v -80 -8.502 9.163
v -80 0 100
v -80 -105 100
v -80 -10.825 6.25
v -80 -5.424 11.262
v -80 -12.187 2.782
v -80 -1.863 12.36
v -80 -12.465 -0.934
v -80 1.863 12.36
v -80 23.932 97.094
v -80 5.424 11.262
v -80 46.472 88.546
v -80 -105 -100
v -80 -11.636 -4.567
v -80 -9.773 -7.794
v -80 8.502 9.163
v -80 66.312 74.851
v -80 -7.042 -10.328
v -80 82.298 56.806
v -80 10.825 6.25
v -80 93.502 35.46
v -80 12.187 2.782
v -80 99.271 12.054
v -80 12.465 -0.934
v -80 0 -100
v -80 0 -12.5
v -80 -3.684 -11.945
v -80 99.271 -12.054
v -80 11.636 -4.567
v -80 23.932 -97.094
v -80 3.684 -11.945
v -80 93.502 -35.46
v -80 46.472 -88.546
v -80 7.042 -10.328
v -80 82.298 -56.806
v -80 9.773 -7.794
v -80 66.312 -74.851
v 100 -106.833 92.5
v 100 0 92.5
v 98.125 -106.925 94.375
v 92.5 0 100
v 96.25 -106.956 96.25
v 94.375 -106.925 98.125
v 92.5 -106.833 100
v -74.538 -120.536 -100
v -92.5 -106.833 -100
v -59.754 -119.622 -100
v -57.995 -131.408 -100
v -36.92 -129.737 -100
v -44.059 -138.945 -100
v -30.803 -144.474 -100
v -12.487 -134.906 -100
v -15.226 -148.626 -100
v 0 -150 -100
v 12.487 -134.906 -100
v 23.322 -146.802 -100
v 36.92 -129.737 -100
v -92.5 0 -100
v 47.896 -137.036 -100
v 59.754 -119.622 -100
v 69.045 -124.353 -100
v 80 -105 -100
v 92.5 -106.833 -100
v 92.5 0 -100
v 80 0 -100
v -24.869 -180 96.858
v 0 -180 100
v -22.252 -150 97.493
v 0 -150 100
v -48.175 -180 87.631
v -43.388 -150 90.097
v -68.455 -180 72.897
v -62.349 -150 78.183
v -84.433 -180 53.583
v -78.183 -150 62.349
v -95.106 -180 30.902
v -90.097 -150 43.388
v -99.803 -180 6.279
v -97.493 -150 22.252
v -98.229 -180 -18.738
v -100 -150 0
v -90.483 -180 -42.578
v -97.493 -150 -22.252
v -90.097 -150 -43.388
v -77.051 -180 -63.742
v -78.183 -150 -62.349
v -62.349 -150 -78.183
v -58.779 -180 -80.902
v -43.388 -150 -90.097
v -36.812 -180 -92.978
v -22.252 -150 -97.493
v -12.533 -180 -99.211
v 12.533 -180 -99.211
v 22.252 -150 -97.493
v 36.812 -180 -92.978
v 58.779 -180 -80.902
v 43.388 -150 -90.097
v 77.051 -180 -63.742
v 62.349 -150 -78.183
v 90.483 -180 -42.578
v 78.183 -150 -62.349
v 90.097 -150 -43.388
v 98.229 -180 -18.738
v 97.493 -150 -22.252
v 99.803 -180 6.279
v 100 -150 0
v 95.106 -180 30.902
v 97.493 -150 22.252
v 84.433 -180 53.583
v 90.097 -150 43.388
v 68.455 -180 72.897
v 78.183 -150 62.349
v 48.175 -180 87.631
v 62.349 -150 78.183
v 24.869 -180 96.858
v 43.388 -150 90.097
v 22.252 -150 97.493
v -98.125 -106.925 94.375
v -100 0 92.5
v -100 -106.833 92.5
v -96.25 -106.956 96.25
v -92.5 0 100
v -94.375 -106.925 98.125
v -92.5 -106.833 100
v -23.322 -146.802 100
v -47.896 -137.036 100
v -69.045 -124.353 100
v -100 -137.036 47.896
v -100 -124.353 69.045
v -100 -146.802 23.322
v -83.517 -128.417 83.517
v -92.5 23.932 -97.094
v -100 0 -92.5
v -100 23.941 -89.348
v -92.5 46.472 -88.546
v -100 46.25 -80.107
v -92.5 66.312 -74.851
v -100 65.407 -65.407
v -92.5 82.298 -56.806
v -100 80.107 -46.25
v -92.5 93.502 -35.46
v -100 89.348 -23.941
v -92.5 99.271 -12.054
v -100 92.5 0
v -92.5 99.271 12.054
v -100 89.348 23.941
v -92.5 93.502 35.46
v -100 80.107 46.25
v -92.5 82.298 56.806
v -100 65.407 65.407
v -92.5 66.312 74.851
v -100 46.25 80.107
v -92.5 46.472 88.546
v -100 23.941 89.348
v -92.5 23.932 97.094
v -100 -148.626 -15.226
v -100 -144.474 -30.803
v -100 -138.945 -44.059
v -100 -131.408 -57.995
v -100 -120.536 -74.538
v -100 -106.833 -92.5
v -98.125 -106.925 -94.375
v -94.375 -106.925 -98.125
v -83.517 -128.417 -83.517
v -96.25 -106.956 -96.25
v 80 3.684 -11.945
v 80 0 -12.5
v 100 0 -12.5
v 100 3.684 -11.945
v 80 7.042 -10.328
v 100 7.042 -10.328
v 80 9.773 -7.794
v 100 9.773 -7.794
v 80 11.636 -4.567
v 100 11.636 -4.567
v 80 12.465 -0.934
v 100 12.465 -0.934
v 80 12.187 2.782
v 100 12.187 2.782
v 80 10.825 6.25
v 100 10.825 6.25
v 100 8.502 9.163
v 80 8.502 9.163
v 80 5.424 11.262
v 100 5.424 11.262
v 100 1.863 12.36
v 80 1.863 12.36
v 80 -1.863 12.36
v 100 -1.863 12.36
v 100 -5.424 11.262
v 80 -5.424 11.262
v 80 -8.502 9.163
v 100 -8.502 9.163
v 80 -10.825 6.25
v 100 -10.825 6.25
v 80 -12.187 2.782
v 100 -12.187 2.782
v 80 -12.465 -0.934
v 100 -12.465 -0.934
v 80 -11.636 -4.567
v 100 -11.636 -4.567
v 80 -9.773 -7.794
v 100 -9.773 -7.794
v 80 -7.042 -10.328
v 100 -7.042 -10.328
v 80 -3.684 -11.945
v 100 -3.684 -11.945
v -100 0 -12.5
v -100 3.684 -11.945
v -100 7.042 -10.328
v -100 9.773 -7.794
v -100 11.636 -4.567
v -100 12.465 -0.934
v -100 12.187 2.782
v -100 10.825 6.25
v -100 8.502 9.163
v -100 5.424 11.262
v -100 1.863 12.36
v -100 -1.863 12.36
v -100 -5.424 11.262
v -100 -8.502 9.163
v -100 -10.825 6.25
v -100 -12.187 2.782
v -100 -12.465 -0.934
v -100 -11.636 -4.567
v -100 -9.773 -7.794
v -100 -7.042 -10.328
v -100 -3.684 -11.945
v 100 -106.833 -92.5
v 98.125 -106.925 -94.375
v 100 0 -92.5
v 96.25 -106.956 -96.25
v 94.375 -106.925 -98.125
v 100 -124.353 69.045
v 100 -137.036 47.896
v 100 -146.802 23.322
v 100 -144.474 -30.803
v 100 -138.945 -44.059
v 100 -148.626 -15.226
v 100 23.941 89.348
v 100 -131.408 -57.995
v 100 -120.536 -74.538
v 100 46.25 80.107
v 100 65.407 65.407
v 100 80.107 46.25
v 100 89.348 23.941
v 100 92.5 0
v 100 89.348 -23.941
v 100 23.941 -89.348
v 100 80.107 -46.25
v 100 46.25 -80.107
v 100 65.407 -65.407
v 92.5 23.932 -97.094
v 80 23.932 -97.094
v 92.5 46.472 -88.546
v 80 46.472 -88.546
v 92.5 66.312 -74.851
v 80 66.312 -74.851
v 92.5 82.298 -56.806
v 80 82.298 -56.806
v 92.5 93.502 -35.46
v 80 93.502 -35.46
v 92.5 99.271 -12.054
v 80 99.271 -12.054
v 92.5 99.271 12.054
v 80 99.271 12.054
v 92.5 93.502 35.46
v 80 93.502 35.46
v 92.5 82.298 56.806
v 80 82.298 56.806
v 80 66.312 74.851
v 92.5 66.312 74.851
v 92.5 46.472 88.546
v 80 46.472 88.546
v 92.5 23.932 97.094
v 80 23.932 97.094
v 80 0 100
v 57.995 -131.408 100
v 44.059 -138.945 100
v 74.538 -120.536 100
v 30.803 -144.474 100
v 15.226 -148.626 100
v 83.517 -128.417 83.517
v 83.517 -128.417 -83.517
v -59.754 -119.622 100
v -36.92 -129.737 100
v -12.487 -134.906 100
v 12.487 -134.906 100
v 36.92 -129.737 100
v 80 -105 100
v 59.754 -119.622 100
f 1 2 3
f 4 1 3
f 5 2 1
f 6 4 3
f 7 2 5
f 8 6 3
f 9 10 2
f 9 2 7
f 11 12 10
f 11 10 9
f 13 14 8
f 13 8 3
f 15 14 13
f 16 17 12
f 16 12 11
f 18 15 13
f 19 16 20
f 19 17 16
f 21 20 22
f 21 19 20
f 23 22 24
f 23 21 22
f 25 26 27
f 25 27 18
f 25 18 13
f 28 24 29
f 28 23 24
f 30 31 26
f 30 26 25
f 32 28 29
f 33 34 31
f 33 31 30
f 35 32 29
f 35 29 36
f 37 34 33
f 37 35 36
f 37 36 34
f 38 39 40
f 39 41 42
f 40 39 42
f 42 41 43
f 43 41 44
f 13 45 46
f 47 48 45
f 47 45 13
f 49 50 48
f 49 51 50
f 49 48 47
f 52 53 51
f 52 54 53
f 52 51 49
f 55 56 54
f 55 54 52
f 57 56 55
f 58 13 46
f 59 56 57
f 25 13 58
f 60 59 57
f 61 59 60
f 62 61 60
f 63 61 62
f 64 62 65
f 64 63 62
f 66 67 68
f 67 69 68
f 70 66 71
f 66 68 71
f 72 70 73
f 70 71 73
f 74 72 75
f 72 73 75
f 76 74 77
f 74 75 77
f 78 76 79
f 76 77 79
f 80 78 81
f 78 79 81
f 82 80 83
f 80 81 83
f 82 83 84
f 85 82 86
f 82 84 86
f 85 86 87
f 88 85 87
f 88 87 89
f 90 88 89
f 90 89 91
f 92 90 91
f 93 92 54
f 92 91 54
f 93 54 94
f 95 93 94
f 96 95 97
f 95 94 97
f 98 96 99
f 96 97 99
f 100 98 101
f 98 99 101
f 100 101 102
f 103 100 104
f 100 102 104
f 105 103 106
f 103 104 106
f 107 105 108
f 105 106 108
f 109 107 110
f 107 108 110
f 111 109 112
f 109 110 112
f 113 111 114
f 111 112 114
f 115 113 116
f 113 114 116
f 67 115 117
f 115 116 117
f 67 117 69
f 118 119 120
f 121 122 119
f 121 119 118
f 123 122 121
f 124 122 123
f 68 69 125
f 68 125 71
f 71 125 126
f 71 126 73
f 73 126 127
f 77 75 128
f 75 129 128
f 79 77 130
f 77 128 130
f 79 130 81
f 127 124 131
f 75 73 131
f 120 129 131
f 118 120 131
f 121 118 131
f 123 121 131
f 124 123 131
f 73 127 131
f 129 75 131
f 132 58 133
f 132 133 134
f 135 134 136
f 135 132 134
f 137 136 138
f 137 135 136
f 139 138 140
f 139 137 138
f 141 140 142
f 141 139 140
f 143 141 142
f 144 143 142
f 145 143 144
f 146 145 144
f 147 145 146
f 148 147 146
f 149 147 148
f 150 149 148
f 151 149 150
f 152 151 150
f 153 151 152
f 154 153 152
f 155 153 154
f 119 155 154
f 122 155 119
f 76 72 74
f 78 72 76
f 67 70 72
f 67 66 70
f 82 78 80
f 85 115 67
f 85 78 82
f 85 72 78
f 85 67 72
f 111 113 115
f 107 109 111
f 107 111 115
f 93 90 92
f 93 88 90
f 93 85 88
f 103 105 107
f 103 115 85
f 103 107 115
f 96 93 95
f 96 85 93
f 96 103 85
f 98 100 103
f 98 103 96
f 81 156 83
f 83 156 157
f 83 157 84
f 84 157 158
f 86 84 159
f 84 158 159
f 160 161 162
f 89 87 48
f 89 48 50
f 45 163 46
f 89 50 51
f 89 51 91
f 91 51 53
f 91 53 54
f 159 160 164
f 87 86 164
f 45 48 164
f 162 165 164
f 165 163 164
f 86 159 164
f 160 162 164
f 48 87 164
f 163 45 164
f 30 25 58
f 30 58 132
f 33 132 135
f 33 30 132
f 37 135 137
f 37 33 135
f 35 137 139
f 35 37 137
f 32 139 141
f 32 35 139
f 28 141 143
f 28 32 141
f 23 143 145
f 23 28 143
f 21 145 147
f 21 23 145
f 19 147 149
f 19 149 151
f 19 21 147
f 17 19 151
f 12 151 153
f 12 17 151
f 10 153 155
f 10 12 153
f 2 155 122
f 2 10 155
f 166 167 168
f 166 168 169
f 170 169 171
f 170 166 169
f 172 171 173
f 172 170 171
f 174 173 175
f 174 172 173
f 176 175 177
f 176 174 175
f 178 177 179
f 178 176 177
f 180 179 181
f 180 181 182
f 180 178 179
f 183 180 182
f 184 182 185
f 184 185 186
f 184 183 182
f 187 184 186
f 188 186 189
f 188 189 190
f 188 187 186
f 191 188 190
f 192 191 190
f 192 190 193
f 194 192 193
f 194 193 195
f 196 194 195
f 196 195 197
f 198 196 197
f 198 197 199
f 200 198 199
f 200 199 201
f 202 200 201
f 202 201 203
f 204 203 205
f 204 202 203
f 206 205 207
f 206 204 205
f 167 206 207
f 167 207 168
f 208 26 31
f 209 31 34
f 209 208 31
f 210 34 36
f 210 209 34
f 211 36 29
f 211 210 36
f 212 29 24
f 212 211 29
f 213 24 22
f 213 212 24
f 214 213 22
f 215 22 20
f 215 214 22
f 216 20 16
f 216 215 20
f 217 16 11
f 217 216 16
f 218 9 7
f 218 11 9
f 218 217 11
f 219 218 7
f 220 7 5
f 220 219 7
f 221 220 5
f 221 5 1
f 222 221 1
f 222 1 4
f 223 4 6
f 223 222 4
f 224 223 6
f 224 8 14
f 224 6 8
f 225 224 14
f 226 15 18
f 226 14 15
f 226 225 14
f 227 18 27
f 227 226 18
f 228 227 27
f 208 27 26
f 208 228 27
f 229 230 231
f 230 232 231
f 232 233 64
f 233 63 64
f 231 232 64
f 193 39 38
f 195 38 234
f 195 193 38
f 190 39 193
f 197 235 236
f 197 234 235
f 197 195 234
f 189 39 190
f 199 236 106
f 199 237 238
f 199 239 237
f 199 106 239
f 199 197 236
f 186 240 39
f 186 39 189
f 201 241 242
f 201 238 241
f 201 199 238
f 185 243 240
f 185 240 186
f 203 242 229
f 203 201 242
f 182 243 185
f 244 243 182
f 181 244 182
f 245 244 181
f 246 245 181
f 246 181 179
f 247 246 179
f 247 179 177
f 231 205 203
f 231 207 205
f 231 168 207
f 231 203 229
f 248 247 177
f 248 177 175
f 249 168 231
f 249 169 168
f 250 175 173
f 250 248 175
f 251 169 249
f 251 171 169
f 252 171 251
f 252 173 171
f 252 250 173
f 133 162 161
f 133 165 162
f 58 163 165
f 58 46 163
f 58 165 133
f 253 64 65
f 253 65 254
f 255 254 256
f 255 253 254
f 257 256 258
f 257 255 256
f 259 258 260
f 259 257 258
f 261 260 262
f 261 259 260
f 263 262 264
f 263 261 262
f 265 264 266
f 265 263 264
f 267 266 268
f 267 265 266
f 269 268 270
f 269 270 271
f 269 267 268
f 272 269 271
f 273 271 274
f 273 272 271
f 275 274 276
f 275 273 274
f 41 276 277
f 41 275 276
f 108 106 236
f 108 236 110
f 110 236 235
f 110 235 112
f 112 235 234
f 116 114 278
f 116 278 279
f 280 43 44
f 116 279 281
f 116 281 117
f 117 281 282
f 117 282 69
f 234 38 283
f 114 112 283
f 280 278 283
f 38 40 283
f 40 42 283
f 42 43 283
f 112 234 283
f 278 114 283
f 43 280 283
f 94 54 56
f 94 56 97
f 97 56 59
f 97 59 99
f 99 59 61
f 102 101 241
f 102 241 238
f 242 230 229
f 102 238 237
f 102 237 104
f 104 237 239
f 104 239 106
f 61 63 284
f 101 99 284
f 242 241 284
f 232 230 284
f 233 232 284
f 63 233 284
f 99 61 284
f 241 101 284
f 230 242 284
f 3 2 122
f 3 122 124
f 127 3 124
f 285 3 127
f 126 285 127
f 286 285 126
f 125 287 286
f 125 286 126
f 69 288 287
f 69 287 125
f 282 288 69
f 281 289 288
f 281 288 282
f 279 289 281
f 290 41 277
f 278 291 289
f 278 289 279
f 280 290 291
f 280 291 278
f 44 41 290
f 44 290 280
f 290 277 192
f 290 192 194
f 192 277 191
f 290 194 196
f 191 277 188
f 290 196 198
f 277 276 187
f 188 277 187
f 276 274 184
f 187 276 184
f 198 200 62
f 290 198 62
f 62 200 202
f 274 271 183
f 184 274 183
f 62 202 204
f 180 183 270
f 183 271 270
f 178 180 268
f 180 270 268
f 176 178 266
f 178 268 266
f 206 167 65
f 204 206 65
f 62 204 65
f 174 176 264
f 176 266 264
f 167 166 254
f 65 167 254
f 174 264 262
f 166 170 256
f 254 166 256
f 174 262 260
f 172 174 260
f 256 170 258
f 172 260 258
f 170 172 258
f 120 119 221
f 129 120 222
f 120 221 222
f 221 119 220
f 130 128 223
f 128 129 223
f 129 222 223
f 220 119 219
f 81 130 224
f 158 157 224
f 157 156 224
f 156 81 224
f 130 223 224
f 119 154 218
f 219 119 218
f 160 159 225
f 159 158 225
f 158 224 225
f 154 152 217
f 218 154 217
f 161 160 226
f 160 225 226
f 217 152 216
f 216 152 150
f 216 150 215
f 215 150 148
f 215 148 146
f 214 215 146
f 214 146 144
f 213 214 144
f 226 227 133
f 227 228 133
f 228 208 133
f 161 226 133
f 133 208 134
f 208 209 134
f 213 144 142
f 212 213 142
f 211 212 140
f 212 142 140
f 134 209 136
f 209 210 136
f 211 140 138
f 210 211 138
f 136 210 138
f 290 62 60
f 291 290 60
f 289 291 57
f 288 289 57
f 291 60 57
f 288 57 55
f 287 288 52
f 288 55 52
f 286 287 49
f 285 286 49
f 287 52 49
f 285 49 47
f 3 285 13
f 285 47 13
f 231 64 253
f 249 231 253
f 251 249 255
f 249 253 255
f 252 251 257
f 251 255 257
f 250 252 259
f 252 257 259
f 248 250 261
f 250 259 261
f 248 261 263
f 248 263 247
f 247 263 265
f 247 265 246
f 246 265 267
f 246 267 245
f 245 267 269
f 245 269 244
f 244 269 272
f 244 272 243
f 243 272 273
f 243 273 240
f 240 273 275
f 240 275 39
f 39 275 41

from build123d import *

# Parameters (mm, degrees)
SKETCH1_R               = 12.5
BOSS_EXTRUDE1_DEPTH     = 100
CUT_EXTRUDE1_DEPTH      = 80
CHAMFER2_SIZE           = 7.5
CUT_EXTRUDE2_DEPTH      = 288.054001888
CUT_EXTRUDE2_DEPTH_BACK = 288.054001888


with BuildPart() as part:
    # Sketch1 → Boss-Extrude1 (new, symmetric)
    with BuildSketch(Plane(origin=(0, 0, 0), x_dir=(0, 0, -1), z_dir=(1, 0, 0))):
        with BuildLine():
            Line((-100, 0), (-100, -180))
            Line((-100, -180), (100, -180))
            Line((100, -180), (100, 0))
            ThreePointArc((100, 0), (0, 100), (-100, 0))
        make_face()
        Circle(SKETCH1_R, mode=Mode.SUBTRACT)
    extrude(amount=BOSS_EXTRUDE1_DEPTH, both=True)

    # Sketch2 → Cut-Revolve1 (revolve, cut)
    with BuildSketch(Plane(origin=(0, 0, 0), x_dir=(0, 0, -1), z_dir=(1, 0, 0)), mode=Mode.PRIVATE) as cut_revolve1_sk:
        Polygon((100, -180), (100, -150), (150, -90.41232037), (150, -180), align=None)
    revolve(cut_revolve1_sk.sketch.rotate(Axis((0, 100, 0), (0, -1, 0)), 180), axis=Axis((0, 100, 0), (0, -1, 0)), mode=Mode.SUBTRACT)

    # Sketch3 → Cut-Extrude1 (cut, symmetric)
    with BuildSketch(Plane(origin=(0, 0, 0), x_dir=(0, 0, -1), z_dir=(1, 0, 0))):
        with BuildLine():
            Line((-100, 0), (-100, -105))
            Line((-100, -105), (100, -105))
            Line((100, -105), (100, 0))
            ThreePointArc((100, 0), (0, 100), (-100, 0))
        make_face()
    extrude(amount=CUT_EXTRUDE1_DEPTH, both=True, mode=Mode.SUBTRACT)

    # Chamfer2
    chamfer2_edges = [part.edges().sort_by_distance(p)[0] for p in [
        (100, -50.317974947, -100),
        (100, -50.317974947, 100),
        (100, 100, 0),
        (-100, -50.317974947, -100),
        (-100, -50.317974947, 100),
        (-100, 100, 0),
    ]]
    chamfer(chamfer2_edges, length=CHAMFER2_SIZE)

    # Sketch4 → Cut-Extrude2 (cut, two sides: drawn at the far end of the back side and taken through both)
    with BuildSketch(Plane.XY.offset(100).offset(-CUT_EXTRUDE2_DEPTH_BACK)):
        with BuildLine():
            Line((-80, -105), (80, -105))
            ThreePointArc((80, -105), (0, -135.5572809), (-80, -105))
        make_face()
    extrude(amount=CUT_EXTRUDE2_DEPTH + CUT_EXTRUDE2_DEPTH_BACK, mode=Mode.SUBTRACT)


solid = part.part
